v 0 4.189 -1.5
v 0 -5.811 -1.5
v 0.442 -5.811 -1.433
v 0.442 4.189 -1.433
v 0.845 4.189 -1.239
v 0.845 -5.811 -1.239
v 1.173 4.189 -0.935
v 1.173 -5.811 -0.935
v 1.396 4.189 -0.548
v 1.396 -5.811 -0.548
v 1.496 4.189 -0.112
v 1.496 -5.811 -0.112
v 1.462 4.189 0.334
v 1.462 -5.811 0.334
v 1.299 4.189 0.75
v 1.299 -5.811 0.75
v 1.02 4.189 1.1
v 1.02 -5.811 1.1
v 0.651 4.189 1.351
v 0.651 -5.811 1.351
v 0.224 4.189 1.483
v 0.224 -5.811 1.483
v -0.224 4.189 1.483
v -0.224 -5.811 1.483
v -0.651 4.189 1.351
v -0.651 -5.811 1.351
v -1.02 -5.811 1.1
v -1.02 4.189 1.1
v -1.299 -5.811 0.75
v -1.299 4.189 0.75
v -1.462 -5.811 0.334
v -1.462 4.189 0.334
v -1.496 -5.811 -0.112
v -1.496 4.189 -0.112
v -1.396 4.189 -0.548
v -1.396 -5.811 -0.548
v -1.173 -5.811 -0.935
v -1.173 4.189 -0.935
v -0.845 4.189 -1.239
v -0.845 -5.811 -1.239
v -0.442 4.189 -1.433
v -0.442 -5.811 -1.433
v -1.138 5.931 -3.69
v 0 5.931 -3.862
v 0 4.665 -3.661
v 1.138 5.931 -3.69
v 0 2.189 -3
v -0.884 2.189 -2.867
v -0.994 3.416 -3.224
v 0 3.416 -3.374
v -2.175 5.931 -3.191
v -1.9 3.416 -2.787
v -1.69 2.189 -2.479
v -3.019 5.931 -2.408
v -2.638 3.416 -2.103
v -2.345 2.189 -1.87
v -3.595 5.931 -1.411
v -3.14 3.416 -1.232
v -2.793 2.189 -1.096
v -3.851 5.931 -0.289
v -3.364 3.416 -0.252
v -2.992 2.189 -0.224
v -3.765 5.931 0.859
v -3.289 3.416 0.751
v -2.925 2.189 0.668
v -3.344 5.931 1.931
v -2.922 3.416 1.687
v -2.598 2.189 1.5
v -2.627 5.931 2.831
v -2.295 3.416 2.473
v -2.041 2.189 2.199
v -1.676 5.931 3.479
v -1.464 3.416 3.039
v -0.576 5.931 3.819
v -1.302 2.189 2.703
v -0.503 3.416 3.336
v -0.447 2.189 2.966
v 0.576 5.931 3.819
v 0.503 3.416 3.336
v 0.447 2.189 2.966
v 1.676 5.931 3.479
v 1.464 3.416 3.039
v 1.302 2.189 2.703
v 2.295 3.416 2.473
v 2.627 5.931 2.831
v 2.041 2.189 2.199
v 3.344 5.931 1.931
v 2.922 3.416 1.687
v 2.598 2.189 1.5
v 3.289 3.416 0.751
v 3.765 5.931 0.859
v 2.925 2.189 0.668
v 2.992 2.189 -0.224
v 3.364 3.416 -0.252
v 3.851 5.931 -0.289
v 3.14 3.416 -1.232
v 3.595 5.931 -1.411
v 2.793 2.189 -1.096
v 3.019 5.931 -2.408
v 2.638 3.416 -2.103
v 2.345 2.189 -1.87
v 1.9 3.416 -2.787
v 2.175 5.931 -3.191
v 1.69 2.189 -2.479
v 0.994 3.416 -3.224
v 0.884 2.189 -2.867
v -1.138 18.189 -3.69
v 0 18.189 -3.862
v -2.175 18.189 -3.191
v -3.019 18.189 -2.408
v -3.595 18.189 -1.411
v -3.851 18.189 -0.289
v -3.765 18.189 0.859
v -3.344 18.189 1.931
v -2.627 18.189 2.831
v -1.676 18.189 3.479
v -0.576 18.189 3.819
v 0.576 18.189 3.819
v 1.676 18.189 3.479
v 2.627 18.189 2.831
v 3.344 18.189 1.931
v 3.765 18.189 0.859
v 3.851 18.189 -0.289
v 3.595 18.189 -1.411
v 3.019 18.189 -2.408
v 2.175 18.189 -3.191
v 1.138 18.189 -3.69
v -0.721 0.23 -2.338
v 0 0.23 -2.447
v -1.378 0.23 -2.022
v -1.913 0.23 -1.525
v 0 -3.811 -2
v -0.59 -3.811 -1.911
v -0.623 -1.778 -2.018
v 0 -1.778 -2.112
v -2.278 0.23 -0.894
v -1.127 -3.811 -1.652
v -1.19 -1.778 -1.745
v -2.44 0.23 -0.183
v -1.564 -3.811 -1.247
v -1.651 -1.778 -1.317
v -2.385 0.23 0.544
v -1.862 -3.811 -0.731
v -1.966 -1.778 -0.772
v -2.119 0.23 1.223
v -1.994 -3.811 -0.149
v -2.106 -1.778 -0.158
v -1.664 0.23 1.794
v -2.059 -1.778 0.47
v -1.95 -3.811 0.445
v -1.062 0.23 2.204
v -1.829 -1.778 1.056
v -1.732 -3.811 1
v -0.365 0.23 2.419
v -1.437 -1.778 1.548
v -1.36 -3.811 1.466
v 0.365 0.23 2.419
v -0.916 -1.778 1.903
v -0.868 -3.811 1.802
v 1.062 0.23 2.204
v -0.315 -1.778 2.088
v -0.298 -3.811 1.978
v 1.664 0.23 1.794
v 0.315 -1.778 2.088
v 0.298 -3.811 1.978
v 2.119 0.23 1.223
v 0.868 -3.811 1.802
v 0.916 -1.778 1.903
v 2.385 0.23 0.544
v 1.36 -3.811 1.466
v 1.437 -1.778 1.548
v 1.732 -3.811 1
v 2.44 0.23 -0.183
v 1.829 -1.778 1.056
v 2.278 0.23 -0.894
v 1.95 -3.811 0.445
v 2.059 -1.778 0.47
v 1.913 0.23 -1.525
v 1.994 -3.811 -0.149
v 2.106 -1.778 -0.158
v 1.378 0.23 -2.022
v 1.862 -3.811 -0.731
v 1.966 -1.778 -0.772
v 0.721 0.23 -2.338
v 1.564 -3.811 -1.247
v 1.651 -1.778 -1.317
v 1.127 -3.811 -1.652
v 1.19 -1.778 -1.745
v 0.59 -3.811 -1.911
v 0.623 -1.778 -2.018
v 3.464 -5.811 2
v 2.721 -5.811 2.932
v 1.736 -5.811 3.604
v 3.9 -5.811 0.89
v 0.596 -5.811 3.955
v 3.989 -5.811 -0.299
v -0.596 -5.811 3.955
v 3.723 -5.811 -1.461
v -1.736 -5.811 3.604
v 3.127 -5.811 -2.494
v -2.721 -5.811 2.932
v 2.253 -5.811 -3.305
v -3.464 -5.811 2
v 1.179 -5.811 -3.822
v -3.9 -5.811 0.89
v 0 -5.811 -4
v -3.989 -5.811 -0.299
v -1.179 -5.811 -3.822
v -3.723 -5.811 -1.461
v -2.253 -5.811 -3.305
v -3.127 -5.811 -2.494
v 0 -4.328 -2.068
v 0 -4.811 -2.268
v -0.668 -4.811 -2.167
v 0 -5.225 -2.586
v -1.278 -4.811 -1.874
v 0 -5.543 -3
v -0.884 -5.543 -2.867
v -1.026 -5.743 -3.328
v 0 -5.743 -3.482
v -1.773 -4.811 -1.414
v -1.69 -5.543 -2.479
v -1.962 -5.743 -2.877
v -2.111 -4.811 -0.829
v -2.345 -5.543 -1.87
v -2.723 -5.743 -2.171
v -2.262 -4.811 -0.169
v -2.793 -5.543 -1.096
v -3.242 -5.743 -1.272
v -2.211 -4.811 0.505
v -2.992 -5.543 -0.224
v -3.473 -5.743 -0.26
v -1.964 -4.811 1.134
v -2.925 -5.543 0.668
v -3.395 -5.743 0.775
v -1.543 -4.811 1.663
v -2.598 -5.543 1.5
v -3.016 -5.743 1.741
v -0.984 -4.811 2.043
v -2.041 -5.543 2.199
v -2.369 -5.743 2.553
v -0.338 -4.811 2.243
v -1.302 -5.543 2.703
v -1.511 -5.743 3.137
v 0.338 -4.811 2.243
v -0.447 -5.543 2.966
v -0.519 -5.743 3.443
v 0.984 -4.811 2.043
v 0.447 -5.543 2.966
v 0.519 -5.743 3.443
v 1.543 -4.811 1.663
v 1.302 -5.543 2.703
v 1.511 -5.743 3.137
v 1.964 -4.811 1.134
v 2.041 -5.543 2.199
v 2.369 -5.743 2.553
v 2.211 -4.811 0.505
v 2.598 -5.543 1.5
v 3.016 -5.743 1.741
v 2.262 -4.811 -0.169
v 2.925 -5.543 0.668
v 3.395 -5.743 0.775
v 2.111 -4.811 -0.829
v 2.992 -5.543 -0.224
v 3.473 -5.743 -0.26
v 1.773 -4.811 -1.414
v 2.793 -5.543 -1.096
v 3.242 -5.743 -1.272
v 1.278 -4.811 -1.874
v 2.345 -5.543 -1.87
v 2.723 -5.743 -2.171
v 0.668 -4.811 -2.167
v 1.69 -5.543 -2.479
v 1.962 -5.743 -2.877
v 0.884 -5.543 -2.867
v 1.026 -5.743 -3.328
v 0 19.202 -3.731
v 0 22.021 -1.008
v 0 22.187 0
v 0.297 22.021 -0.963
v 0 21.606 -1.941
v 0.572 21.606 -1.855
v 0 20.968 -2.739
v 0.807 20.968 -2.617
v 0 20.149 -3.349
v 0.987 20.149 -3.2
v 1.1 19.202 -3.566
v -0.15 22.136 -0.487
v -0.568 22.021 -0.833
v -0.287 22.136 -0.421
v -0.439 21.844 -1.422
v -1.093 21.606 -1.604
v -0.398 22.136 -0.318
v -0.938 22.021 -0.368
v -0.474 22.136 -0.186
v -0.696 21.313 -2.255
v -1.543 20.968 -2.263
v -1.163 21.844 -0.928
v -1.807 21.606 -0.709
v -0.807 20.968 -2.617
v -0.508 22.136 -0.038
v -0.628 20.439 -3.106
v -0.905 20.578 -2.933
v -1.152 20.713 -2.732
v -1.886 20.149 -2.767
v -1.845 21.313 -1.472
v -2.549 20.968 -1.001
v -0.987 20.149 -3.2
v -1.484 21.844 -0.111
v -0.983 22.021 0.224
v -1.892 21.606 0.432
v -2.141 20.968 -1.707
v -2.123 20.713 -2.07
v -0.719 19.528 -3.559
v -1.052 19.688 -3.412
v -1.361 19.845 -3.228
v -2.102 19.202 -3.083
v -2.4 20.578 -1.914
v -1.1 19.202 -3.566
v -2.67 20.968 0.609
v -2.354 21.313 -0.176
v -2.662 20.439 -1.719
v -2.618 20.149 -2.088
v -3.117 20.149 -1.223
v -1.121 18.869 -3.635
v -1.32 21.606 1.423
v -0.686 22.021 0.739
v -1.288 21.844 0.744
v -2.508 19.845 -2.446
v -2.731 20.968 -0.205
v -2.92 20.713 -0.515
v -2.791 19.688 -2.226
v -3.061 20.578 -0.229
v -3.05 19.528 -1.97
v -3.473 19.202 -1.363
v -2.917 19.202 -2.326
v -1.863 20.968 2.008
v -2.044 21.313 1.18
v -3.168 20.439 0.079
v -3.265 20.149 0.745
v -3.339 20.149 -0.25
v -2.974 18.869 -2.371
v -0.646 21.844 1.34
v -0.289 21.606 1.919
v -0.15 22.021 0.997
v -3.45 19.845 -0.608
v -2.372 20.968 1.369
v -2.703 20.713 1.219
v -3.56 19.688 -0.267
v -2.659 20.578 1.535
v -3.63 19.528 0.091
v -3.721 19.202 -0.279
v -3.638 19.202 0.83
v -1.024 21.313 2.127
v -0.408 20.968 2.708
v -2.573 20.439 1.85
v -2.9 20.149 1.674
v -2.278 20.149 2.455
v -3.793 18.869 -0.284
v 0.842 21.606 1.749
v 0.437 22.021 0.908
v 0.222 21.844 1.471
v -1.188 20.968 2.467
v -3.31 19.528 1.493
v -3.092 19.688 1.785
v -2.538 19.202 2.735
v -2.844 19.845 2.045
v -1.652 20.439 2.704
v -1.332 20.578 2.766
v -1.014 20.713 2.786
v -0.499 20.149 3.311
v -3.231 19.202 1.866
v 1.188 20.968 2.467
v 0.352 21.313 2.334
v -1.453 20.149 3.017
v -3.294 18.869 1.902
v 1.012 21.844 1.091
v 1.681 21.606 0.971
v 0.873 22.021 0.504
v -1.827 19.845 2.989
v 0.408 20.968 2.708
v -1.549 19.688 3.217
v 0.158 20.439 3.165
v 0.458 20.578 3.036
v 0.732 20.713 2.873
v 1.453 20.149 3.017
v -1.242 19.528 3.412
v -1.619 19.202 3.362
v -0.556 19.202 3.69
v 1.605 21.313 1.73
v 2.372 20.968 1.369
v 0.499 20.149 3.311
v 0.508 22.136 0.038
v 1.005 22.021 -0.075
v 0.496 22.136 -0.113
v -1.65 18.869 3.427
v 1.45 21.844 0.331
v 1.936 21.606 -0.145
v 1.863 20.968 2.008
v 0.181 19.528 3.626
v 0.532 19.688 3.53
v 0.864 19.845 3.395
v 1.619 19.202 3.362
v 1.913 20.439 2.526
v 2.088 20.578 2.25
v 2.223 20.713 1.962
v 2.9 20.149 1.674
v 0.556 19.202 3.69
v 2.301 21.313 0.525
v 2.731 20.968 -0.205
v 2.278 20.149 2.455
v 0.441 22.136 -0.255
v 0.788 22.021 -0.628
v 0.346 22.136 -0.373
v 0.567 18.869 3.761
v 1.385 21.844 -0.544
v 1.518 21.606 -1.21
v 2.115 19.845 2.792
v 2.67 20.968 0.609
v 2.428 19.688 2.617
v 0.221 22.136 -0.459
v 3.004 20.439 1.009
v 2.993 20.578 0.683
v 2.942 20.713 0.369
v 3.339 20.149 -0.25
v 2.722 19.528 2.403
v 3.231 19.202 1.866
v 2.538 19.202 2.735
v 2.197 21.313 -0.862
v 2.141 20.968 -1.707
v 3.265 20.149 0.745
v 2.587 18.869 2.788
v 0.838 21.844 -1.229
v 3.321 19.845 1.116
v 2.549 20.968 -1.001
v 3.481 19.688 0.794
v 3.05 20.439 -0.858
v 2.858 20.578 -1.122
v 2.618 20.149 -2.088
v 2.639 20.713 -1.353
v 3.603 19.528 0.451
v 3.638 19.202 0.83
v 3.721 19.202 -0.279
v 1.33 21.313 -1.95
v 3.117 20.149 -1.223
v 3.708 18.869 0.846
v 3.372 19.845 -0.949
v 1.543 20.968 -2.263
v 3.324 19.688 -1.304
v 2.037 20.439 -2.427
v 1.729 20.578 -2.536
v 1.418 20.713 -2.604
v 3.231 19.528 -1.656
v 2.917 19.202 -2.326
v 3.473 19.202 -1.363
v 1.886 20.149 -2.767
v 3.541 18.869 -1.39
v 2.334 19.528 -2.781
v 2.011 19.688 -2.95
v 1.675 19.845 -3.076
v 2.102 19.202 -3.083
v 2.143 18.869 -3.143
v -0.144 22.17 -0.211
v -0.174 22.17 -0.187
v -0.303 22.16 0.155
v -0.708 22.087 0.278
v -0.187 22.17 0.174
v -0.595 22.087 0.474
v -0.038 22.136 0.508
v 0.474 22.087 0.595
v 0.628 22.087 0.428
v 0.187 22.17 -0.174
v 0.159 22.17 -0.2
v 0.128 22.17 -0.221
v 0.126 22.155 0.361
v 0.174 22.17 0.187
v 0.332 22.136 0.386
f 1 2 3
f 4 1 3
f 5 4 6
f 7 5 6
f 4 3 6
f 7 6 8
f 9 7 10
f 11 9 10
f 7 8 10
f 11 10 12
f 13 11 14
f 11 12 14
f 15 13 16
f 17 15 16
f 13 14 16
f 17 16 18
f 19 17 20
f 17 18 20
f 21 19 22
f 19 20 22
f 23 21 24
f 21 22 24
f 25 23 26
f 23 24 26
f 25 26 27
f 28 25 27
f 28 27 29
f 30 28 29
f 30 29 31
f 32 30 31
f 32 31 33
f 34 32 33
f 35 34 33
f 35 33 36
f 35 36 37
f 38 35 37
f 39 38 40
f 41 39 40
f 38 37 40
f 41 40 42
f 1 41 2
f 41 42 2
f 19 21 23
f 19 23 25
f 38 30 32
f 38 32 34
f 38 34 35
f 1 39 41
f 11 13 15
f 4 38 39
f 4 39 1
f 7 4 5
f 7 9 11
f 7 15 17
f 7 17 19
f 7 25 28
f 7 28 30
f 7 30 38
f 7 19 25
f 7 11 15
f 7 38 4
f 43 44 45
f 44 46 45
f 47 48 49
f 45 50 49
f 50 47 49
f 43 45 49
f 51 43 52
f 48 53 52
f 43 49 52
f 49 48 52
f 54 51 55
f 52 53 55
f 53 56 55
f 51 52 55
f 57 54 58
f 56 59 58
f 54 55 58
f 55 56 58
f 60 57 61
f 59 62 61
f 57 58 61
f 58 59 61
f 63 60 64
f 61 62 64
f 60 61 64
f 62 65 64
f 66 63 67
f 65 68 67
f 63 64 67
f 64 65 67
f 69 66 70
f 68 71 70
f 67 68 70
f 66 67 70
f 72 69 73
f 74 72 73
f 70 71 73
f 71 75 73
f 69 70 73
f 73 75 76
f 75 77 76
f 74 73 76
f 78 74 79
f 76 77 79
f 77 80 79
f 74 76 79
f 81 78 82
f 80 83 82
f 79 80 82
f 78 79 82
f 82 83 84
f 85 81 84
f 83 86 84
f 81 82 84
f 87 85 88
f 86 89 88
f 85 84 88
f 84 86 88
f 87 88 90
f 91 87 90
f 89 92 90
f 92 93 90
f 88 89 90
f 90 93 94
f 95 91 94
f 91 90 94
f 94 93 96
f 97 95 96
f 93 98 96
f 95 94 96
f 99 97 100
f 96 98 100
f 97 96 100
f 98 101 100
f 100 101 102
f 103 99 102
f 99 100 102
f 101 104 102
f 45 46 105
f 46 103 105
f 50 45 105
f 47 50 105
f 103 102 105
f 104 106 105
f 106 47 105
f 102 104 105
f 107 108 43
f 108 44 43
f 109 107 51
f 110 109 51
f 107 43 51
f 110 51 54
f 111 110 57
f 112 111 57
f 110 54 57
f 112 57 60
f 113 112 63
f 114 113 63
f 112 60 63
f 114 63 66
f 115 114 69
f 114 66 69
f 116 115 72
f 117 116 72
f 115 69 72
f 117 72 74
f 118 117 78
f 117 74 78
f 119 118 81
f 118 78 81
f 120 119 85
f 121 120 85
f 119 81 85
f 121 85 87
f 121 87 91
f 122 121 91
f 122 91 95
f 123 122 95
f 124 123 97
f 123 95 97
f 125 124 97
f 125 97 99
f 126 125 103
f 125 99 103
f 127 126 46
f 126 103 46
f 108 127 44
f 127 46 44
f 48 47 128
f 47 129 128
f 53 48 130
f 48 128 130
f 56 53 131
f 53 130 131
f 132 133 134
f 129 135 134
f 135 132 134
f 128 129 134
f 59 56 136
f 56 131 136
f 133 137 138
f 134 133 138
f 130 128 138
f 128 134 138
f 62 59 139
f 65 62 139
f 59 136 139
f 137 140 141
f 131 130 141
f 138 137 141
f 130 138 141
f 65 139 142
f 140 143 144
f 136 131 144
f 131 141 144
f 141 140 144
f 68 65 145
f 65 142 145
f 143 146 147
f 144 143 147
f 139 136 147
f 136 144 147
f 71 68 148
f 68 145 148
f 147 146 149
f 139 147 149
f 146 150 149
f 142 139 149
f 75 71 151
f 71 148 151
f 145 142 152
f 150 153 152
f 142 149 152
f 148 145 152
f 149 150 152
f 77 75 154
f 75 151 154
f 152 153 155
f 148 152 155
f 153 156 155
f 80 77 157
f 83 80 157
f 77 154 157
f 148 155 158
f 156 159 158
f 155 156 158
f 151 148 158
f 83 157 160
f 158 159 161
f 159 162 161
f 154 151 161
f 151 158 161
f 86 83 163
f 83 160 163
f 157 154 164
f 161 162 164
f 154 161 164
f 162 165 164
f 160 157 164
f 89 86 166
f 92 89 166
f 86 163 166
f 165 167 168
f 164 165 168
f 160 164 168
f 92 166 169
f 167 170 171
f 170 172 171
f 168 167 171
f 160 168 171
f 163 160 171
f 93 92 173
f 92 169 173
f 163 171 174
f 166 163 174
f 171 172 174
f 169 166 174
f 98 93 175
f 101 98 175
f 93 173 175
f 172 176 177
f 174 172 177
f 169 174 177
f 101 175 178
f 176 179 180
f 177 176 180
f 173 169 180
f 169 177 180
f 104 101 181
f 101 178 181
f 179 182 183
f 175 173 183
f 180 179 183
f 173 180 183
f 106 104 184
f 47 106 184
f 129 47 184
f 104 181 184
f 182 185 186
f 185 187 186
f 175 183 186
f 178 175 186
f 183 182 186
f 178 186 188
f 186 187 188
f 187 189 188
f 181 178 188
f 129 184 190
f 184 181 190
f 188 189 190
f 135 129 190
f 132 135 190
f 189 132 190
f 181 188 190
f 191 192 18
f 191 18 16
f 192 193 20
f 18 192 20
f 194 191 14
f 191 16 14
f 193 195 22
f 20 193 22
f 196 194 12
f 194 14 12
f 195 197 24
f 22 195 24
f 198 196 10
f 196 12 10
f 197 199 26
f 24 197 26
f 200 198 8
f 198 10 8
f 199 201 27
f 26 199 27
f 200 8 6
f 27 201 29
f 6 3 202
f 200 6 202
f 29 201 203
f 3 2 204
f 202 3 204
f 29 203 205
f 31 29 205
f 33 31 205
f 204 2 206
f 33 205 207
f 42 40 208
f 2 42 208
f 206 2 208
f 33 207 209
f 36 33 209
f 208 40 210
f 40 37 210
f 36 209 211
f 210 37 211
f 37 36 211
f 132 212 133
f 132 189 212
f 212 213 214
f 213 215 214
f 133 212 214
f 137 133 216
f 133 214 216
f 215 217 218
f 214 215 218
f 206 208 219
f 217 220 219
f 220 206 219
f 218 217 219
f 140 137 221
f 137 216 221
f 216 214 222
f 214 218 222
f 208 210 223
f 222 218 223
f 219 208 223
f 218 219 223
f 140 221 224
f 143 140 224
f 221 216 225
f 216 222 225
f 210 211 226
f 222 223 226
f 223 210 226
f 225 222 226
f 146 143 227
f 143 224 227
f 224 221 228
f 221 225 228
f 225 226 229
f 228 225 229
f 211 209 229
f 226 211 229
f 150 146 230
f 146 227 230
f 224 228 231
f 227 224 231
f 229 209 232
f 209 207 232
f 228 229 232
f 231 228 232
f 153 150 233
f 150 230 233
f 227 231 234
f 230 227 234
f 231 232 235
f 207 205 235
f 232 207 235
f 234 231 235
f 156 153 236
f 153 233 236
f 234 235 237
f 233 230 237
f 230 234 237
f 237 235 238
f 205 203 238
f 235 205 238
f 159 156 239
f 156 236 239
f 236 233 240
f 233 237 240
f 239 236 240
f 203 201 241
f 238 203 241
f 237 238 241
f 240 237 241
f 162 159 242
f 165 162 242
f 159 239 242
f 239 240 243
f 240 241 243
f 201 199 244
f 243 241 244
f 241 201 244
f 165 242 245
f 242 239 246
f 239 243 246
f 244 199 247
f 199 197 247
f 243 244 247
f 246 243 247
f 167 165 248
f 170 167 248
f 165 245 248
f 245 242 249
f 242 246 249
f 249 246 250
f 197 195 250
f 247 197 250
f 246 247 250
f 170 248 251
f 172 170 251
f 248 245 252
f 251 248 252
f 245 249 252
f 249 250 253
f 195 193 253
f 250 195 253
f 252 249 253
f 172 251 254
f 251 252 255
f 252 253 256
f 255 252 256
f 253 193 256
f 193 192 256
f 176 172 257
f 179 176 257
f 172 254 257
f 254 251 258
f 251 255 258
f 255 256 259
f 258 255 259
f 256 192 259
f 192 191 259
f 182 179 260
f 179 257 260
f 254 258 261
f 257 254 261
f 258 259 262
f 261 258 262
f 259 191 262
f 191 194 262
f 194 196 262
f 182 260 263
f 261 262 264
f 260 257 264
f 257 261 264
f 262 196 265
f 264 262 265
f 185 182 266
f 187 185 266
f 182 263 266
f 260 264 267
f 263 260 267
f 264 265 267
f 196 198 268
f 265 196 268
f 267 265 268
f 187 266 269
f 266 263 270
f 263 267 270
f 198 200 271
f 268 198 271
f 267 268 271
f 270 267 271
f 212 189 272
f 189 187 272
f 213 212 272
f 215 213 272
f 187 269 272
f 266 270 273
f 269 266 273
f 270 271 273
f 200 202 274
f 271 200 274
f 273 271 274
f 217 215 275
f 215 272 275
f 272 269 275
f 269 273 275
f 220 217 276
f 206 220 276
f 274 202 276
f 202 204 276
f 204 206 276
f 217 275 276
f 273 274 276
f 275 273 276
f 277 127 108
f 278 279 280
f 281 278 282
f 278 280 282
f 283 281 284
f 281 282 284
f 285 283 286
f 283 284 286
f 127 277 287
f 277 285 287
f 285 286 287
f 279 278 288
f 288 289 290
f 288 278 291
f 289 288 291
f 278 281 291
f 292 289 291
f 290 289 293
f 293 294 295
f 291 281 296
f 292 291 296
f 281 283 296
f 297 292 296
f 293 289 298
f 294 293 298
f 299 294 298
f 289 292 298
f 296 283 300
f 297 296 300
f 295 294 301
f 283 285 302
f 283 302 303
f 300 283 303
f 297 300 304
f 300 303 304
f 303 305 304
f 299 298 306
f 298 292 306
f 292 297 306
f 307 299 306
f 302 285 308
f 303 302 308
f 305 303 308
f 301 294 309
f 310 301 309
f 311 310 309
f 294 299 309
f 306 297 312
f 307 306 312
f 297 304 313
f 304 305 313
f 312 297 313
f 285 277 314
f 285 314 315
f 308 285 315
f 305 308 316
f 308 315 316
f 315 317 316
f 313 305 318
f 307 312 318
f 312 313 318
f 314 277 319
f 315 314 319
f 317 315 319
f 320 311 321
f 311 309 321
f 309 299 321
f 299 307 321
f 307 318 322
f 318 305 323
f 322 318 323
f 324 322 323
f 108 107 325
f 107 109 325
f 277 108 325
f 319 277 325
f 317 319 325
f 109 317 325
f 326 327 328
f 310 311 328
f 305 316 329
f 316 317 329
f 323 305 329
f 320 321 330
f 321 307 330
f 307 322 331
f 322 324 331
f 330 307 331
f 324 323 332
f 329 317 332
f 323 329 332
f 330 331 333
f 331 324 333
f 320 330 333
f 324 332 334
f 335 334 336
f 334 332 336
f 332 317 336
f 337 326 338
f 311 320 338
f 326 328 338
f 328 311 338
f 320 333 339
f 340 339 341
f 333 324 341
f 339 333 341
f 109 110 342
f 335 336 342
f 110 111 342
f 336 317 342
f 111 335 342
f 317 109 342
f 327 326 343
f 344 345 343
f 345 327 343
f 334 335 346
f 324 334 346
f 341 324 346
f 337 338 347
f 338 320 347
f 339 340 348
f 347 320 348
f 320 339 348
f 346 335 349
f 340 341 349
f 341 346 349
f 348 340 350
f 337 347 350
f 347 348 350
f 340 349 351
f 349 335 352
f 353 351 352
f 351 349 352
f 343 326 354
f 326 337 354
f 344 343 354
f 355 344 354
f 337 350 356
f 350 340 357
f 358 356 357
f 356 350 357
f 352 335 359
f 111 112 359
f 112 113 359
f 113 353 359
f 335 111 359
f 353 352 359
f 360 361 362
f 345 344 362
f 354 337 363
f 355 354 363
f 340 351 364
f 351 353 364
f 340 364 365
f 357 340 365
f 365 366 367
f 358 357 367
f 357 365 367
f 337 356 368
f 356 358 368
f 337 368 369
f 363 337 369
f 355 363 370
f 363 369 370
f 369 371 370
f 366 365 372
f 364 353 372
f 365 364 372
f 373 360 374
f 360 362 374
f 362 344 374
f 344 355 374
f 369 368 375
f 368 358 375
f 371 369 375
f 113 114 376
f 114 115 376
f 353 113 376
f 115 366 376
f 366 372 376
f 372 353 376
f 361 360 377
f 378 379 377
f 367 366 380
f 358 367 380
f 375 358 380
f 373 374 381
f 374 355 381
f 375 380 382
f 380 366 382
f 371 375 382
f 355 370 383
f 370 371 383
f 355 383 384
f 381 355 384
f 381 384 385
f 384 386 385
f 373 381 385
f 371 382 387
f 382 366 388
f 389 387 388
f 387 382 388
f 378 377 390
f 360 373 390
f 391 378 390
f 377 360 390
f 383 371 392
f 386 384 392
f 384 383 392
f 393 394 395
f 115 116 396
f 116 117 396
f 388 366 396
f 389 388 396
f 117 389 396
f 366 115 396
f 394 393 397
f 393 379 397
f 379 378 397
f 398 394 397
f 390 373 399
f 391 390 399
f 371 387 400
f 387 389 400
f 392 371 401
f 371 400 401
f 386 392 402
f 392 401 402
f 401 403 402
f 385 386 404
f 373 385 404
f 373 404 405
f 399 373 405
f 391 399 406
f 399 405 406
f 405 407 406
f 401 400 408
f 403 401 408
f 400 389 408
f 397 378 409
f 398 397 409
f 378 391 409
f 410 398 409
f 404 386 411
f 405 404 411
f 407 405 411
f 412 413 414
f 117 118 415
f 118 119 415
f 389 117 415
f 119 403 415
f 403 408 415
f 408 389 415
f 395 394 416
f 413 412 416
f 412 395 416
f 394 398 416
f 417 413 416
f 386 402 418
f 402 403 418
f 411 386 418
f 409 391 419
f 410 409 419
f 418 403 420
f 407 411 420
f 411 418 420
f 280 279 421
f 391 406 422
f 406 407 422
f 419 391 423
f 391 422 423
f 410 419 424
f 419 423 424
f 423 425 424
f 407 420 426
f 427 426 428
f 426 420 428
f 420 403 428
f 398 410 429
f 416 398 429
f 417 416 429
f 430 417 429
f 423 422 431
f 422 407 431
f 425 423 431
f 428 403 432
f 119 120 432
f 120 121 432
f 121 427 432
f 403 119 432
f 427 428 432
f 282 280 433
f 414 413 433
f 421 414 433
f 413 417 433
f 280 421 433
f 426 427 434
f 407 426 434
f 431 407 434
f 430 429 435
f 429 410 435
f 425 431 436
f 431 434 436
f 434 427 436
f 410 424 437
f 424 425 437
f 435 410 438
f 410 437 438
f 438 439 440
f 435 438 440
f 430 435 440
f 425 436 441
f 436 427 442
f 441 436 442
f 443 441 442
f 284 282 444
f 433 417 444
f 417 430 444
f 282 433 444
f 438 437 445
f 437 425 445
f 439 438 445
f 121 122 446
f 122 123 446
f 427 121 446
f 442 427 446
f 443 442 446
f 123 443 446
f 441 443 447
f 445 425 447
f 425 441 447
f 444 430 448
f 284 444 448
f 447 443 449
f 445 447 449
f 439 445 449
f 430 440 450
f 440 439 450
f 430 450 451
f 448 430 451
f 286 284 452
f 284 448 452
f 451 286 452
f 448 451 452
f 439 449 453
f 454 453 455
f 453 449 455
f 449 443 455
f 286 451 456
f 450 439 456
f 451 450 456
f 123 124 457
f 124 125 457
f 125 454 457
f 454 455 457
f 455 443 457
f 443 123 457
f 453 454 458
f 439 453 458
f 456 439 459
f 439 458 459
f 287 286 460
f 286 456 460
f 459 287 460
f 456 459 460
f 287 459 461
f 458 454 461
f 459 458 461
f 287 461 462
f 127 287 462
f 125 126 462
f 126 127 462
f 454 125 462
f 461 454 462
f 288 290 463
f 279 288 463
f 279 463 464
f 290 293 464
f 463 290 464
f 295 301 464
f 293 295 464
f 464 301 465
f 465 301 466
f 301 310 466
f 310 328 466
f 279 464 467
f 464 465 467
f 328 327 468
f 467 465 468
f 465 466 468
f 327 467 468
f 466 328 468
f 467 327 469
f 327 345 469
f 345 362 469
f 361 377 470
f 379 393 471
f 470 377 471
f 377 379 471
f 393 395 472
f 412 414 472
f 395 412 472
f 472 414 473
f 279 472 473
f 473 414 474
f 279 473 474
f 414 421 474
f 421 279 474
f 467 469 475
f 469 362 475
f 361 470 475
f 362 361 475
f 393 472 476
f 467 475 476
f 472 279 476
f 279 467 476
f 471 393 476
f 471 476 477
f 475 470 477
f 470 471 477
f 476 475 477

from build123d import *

# Parameters (mm, degrees)
CROQUIS2_R            = 1.5
CORTAR_EXTRUIR1_DEPTH = 10


with BuildPart() as part:
    # Croquis1 → Revolución1 (revolve)
    with BuildSketch(Plane.XY, mode=Mode.PRIVATE) as revoluci_n1_sk:
        with BuildLine():
            Line((0, -5.810793785), (0, 22.186814978))
            ThreePointArc((0, 22.186814978), (2.738614464, 20.96831032), (3.861709813, 18.189206215))
            Line((3.861709813, 18.189206215), (3.861709813, 5.931416864))
            ThreePointArc((3.861709813, 5.931416864), (3.528216573, 4.037892304), (3, 2.189206215))
            ThreePointArc((3, 2.189206215), (2.251712409, -0.76941252), (2, -3.810793785))
            ThreePointArc((2, -3.810793785), (2.585786438, -5.225007347), (4, -5.810793785))
            Line((4, -5.810793785), (0, -5.810793785))
        make_face()
    revolve(revoluci_n1_sk.sketch.rotate(Axis((0, -5.810793785, 0), (0, 1, 0)), 90), axis=Axis((0, -5.810793785, 0), (0, 1, 0)))

    # Croquis2 → Cortar-Extruir1 (cut)
    with BuildSketch(Plane.XZ.offset(5.810793785)):
        with Locations(Location((0, 0, 0), (0, 0, 270))):
            Circle(CROQUIS2_R)
    extrude(amount=-CORTAR_EXTRUIR1_DEPTH, mode=Mode.SUBTRACT)


solid = part.part
